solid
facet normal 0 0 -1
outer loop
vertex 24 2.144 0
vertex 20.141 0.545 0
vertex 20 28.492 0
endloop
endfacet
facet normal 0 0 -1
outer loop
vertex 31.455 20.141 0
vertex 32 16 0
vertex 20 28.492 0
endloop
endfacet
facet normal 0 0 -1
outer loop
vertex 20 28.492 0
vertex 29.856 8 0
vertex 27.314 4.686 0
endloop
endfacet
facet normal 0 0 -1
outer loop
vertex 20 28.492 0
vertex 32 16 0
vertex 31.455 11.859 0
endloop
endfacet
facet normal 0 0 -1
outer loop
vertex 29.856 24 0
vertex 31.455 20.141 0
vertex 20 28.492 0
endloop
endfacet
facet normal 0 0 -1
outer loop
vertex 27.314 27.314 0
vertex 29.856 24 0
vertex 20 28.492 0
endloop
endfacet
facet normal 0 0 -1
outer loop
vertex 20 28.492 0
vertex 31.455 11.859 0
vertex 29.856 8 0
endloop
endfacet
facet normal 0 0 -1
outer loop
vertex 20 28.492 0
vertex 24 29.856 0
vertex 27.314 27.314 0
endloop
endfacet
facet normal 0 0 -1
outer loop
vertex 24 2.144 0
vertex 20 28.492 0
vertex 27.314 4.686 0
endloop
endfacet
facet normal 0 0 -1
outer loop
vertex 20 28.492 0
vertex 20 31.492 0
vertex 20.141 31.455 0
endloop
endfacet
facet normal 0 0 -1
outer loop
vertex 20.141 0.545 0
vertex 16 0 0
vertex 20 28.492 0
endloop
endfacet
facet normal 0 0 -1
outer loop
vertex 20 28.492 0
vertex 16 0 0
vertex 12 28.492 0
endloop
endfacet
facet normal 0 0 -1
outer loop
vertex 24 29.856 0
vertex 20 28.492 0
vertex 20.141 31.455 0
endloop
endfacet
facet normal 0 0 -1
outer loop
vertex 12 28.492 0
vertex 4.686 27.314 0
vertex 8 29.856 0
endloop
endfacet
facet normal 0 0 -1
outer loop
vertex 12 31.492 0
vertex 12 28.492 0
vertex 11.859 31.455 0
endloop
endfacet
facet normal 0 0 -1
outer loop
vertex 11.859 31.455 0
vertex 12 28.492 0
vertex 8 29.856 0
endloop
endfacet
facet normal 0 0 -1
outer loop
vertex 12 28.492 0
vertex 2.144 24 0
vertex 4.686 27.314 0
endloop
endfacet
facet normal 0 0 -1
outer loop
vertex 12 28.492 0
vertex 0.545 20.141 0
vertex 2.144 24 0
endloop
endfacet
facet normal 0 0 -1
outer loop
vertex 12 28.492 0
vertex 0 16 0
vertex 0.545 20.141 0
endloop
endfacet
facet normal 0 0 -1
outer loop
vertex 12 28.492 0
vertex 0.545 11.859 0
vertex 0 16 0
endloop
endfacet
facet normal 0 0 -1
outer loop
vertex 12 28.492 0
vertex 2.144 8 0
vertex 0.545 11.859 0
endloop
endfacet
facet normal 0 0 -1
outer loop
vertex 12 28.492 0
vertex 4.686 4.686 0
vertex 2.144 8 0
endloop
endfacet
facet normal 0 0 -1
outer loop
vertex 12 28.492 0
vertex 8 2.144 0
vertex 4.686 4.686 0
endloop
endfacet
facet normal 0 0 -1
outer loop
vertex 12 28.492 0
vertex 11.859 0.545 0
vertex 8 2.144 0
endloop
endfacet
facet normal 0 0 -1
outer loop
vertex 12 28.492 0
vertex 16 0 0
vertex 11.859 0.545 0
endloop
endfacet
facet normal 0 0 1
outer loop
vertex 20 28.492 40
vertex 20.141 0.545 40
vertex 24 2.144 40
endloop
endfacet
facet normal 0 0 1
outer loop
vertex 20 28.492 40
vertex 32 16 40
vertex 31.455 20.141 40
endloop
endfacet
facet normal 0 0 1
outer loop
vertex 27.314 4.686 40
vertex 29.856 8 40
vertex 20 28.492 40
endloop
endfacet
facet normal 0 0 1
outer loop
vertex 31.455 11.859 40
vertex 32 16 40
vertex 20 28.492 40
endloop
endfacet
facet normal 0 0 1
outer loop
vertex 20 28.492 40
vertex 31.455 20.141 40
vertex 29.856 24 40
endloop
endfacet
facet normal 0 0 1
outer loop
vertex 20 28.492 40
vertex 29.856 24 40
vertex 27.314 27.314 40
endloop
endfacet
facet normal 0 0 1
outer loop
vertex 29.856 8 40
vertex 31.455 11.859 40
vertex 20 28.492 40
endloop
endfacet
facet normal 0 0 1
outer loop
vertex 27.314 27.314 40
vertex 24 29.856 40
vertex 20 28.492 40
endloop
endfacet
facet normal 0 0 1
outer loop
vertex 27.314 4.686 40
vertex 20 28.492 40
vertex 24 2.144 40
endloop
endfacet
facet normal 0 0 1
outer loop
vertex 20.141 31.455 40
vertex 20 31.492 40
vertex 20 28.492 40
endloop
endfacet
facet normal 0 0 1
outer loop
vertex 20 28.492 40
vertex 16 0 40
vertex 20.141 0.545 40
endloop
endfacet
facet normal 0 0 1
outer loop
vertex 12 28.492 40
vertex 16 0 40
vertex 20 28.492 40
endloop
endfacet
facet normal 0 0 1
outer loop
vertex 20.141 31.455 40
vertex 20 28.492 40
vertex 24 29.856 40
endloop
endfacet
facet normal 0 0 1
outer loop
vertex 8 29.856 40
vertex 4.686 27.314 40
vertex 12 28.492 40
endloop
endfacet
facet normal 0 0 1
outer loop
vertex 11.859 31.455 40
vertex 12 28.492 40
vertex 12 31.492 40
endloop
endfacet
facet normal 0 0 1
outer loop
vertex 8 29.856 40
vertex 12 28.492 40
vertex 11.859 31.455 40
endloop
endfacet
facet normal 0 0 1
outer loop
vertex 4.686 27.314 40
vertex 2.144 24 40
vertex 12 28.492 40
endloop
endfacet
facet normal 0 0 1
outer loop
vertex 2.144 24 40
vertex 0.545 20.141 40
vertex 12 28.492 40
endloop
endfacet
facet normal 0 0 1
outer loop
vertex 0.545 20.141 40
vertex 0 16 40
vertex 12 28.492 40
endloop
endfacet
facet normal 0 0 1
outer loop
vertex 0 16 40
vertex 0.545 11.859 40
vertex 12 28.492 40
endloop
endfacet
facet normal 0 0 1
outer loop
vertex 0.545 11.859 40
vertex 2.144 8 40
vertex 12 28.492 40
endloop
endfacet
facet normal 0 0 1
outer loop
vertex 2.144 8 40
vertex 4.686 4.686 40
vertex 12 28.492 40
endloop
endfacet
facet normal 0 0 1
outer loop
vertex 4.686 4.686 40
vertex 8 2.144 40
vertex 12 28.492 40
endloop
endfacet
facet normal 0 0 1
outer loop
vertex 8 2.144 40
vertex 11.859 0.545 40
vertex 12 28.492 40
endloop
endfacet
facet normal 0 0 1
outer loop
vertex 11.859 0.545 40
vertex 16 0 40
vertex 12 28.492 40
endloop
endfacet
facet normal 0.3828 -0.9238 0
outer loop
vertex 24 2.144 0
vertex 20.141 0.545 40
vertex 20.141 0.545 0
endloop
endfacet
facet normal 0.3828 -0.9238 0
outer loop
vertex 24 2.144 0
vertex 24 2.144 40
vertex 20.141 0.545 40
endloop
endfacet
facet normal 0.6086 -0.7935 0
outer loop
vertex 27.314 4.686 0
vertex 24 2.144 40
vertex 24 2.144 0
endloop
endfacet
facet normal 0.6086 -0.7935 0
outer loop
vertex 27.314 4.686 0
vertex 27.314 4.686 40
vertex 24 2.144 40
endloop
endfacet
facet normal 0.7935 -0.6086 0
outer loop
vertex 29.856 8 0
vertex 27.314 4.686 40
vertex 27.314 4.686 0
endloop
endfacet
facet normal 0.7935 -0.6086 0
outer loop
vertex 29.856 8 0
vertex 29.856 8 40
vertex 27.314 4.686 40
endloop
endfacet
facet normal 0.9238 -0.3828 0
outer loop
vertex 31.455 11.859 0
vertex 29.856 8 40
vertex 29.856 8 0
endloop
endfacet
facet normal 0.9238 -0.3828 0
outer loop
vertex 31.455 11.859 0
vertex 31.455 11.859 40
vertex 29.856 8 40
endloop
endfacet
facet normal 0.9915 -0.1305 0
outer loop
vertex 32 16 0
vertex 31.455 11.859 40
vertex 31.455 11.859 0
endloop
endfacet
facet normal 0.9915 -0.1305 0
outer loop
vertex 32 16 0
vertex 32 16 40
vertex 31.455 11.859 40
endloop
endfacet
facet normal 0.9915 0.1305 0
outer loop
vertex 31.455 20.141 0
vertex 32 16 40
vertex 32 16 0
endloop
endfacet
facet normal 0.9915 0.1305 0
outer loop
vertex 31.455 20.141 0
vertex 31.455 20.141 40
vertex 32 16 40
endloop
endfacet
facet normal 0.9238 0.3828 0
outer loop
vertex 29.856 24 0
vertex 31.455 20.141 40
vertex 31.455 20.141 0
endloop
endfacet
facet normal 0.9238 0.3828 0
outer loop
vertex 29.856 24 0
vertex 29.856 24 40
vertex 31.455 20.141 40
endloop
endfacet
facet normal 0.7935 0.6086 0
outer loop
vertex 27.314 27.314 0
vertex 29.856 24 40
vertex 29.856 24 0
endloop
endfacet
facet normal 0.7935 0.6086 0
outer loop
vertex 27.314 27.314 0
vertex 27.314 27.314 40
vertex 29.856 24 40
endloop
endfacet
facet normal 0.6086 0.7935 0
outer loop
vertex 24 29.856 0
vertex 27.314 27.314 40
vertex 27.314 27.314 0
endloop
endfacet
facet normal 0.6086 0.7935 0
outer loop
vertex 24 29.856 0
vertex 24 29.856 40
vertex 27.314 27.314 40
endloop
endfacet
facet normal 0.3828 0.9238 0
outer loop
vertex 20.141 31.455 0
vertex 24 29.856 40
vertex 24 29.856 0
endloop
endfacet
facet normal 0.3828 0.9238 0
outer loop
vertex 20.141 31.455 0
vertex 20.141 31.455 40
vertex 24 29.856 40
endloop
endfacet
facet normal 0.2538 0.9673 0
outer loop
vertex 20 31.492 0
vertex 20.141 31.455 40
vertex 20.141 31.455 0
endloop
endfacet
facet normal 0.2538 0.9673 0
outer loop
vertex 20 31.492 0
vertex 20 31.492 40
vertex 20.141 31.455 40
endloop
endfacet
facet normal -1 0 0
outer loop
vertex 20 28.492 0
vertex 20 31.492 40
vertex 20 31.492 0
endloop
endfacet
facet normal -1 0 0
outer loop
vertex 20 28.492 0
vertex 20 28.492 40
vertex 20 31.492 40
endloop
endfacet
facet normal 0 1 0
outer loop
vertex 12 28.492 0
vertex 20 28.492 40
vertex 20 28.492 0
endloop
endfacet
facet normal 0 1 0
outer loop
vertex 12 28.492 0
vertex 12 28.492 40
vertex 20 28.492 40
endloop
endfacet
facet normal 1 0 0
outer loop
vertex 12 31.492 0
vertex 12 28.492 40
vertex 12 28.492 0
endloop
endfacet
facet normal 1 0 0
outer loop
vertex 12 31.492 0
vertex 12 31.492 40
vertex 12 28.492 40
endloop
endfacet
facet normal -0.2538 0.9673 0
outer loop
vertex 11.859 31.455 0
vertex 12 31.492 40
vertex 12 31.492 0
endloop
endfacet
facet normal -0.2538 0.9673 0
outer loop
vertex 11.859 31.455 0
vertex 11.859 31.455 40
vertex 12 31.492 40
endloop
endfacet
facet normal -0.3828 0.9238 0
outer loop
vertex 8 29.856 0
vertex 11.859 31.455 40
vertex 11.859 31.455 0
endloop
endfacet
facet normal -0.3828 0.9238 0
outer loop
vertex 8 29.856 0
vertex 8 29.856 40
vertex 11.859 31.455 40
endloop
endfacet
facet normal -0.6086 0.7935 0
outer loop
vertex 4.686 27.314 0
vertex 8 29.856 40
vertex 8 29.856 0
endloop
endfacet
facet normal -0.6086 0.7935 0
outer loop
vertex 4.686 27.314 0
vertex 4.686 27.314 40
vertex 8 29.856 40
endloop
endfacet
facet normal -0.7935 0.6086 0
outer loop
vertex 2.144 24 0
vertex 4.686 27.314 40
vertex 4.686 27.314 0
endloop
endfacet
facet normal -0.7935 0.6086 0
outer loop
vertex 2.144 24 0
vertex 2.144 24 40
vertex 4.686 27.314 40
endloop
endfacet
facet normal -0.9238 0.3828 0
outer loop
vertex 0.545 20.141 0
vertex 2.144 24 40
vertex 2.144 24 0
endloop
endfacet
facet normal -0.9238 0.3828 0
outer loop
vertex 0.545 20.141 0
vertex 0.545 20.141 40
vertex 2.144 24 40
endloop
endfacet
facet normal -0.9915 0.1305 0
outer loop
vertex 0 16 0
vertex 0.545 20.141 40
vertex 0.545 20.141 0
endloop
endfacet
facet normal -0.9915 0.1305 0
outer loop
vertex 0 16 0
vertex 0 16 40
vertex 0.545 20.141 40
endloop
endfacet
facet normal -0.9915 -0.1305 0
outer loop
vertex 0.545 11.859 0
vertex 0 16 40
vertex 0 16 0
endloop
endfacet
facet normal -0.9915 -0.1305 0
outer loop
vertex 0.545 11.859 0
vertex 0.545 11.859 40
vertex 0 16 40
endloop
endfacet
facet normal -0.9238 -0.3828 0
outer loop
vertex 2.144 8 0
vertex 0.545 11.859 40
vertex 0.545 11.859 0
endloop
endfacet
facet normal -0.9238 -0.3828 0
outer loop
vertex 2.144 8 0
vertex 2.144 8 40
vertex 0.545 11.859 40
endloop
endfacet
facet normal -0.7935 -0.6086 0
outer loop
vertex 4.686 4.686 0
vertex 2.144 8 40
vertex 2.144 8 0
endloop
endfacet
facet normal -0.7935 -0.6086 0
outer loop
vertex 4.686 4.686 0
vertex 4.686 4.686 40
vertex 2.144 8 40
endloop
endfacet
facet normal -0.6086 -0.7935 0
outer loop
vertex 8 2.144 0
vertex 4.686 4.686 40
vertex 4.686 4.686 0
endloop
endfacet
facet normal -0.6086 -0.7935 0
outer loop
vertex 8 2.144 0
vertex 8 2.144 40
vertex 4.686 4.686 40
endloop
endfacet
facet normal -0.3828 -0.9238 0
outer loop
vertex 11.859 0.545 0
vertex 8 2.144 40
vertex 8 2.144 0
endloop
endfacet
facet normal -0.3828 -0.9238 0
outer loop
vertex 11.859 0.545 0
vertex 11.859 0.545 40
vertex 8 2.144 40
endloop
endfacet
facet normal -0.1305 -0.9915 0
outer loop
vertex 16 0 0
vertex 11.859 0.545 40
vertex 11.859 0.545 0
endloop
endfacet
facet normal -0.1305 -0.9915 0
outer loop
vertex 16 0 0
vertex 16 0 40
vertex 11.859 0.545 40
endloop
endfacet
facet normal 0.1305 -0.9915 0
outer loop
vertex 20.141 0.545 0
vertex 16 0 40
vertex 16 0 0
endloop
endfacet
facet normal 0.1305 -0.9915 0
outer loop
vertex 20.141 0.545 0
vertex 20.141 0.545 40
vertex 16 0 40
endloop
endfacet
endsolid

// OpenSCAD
$fn = 32;

// ----------------------------------------------------------------------
// Keyway shaft: d32 shaft, key 8 x 3 mm
// ----------------------------------------------------------------------

// --- parameters (mm) ---
shaft_r = 16;             // shaft radius
key_w = 8;                // keyway width
key_d = 3;                // keyway depth below the surface line
plate_t = 40;             // shaft length, Z (extrusion height)
fit_tol = 0.1;            // declared fit tolerance (prompt contract)
free_tol = 0.3;           // declared free tolerance (prompt contract)

shaft_d = 2 * shaft_r;  // shaft diameter
circle_step = 15;  // polygon sampling step, degrees

profile = [[11.859, 31.455], [8, 29.856], [4.686, 27.314], [2.144, 24], [0.545, 20.141], [0, 16], [0.545, 11.859], [2.144, 8], [4.686, 4.686], [8, 2.144], [11.859, 0.545], [16, 0], [20.141, 0.545], [24, 2.144], [27.314, 4.686], [29.856, 8], [31.455, 11.859], [32, 16], [31.455, 20.141], [29.856, 24], [27.314, 27.314], [24, 29.856], [20.141, 31.455], [20, 31.492], [20, 28.492], [12, 28.492], [12, 31.492]];  // primary outline, 27 points, counter clockwise

// --- the one profile operation ---
linear_extrude(height = plate_t) polygon(points = profile);
